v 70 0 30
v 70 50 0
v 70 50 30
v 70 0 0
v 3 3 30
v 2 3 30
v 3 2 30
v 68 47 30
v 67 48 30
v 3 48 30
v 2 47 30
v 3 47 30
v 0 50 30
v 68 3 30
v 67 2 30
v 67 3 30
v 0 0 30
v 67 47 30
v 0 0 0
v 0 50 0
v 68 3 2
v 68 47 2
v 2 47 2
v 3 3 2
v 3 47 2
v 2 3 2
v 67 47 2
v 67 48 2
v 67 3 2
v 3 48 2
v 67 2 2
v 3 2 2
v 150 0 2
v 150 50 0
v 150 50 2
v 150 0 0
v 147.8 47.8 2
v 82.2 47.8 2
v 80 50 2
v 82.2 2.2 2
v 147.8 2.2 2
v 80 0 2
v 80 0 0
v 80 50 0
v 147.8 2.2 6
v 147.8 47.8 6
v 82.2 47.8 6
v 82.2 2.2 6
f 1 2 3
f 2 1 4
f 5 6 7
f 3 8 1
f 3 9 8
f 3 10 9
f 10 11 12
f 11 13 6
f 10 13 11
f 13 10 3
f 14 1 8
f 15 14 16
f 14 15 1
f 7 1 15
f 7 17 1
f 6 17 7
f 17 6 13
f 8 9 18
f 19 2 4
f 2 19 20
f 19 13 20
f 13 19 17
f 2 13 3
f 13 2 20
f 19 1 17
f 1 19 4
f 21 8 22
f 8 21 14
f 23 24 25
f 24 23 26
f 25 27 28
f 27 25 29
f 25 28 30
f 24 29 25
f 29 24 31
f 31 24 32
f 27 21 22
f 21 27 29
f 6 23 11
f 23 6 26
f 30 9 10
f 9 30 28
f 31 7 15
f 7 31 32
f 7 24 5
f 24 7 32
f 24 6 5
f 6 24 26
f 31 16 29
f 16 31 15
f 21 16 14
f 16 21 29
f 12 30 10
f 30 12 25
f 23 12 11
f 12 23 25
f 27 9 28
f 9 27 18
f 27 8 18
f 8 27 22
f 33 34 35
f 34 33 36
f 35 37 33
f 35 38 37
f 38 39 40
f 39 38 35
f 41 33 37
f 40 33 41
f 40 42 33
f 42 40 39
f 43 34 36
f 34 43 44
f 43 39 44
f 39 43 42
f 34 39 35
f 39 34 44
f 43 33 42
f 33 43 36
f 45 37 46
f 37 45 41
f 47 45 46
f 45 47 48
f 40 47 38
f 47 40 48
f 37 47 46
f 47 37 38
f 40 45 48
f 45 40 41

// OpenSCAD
$fn = 64;

// --- Dimensions ---
// Part 1: The Box
box_outer_x = 70;
box_outer_y = 50;
box_outer_z = 30;
wall_thickness = 2;
floor_thickness = 2;
clearance = 0.2;

// Derived Dimensions
box_inner_x = box_outer_x - (wall_thickness * 2);
box_inner_y = box_outer_y - (wall_thickness * 2);
box_inner_z = box_outer_z - floor_thickness;

// Part 2: The Lid
lid_plate_x = 70;
lid_plate_y = 50;
lid_plate_z = 2;
lip_thickness = 1.5;
lip_height = 4;
lip_outer_x = 65.6;
lip_outer_y = 45.6;

// Derived Dimensions
lip_inner_x = lip_outer_x - (lip_thickness * 2);
lip_inner_y = lip_outer_y - (lip_thickness * 2);

// Assembly
lid_offset_x = box_outer_x + 10; // 10mm gap

module box_part() {
    // Outer Shell
    difference() {
        cube([box_outer_x, box_outer_y, box_outer_z]);
        
        // Cut out the interior
        translate([wall_thickness, wall_thickness, floor_thickness])
            cube([box_inner_x, box_inner_y, box_inner_z]);
    }
    
    // Add a small lip on the inside bottom corners for better grip
    // (Optional detail, adds 1mm to inner dimensions)
    translate([wall_thickness, wall_thickness, floor_thickness])
        cube([1, 1, box_inner_z]);
    translate([box_outer_x - wall_thickness - 1, wall_thickness, floor_thickness])
        cube([1, 1, box_inner_z]);
    translate([wall_thickness, box_outer_y - wall_thickness - 1, floor_thickness])
        cube([1, 1, box_inner_z]);
    translate([box_outer_x - wall_thickness - 1, box_outer_y - wall_thickness - 1, floor_thickness])
        cube([1, 1, box_inner_z]);
}

module lid_part() {
    // The main plate
    cube([lid_plate_x, lid_plate_y, lid_plate_z]);
    
    // The rectangular lip on top
    translate([(lid_plate_x - lip_outer_x) / 2, (lid_plate_y - lip_outer_y) / 2, lid_plate_z])
        cube([lip_outer_x, lip_outer_y, lip_height]);
}

// Render
union() {
    // Part 1: The Box
    translate([0, 0, 0])
        box_part();
    
    // Part 2: The Lid (Offset to the right)
    translate([lid_offset_x, 0, 0])
        lid_part();
}
